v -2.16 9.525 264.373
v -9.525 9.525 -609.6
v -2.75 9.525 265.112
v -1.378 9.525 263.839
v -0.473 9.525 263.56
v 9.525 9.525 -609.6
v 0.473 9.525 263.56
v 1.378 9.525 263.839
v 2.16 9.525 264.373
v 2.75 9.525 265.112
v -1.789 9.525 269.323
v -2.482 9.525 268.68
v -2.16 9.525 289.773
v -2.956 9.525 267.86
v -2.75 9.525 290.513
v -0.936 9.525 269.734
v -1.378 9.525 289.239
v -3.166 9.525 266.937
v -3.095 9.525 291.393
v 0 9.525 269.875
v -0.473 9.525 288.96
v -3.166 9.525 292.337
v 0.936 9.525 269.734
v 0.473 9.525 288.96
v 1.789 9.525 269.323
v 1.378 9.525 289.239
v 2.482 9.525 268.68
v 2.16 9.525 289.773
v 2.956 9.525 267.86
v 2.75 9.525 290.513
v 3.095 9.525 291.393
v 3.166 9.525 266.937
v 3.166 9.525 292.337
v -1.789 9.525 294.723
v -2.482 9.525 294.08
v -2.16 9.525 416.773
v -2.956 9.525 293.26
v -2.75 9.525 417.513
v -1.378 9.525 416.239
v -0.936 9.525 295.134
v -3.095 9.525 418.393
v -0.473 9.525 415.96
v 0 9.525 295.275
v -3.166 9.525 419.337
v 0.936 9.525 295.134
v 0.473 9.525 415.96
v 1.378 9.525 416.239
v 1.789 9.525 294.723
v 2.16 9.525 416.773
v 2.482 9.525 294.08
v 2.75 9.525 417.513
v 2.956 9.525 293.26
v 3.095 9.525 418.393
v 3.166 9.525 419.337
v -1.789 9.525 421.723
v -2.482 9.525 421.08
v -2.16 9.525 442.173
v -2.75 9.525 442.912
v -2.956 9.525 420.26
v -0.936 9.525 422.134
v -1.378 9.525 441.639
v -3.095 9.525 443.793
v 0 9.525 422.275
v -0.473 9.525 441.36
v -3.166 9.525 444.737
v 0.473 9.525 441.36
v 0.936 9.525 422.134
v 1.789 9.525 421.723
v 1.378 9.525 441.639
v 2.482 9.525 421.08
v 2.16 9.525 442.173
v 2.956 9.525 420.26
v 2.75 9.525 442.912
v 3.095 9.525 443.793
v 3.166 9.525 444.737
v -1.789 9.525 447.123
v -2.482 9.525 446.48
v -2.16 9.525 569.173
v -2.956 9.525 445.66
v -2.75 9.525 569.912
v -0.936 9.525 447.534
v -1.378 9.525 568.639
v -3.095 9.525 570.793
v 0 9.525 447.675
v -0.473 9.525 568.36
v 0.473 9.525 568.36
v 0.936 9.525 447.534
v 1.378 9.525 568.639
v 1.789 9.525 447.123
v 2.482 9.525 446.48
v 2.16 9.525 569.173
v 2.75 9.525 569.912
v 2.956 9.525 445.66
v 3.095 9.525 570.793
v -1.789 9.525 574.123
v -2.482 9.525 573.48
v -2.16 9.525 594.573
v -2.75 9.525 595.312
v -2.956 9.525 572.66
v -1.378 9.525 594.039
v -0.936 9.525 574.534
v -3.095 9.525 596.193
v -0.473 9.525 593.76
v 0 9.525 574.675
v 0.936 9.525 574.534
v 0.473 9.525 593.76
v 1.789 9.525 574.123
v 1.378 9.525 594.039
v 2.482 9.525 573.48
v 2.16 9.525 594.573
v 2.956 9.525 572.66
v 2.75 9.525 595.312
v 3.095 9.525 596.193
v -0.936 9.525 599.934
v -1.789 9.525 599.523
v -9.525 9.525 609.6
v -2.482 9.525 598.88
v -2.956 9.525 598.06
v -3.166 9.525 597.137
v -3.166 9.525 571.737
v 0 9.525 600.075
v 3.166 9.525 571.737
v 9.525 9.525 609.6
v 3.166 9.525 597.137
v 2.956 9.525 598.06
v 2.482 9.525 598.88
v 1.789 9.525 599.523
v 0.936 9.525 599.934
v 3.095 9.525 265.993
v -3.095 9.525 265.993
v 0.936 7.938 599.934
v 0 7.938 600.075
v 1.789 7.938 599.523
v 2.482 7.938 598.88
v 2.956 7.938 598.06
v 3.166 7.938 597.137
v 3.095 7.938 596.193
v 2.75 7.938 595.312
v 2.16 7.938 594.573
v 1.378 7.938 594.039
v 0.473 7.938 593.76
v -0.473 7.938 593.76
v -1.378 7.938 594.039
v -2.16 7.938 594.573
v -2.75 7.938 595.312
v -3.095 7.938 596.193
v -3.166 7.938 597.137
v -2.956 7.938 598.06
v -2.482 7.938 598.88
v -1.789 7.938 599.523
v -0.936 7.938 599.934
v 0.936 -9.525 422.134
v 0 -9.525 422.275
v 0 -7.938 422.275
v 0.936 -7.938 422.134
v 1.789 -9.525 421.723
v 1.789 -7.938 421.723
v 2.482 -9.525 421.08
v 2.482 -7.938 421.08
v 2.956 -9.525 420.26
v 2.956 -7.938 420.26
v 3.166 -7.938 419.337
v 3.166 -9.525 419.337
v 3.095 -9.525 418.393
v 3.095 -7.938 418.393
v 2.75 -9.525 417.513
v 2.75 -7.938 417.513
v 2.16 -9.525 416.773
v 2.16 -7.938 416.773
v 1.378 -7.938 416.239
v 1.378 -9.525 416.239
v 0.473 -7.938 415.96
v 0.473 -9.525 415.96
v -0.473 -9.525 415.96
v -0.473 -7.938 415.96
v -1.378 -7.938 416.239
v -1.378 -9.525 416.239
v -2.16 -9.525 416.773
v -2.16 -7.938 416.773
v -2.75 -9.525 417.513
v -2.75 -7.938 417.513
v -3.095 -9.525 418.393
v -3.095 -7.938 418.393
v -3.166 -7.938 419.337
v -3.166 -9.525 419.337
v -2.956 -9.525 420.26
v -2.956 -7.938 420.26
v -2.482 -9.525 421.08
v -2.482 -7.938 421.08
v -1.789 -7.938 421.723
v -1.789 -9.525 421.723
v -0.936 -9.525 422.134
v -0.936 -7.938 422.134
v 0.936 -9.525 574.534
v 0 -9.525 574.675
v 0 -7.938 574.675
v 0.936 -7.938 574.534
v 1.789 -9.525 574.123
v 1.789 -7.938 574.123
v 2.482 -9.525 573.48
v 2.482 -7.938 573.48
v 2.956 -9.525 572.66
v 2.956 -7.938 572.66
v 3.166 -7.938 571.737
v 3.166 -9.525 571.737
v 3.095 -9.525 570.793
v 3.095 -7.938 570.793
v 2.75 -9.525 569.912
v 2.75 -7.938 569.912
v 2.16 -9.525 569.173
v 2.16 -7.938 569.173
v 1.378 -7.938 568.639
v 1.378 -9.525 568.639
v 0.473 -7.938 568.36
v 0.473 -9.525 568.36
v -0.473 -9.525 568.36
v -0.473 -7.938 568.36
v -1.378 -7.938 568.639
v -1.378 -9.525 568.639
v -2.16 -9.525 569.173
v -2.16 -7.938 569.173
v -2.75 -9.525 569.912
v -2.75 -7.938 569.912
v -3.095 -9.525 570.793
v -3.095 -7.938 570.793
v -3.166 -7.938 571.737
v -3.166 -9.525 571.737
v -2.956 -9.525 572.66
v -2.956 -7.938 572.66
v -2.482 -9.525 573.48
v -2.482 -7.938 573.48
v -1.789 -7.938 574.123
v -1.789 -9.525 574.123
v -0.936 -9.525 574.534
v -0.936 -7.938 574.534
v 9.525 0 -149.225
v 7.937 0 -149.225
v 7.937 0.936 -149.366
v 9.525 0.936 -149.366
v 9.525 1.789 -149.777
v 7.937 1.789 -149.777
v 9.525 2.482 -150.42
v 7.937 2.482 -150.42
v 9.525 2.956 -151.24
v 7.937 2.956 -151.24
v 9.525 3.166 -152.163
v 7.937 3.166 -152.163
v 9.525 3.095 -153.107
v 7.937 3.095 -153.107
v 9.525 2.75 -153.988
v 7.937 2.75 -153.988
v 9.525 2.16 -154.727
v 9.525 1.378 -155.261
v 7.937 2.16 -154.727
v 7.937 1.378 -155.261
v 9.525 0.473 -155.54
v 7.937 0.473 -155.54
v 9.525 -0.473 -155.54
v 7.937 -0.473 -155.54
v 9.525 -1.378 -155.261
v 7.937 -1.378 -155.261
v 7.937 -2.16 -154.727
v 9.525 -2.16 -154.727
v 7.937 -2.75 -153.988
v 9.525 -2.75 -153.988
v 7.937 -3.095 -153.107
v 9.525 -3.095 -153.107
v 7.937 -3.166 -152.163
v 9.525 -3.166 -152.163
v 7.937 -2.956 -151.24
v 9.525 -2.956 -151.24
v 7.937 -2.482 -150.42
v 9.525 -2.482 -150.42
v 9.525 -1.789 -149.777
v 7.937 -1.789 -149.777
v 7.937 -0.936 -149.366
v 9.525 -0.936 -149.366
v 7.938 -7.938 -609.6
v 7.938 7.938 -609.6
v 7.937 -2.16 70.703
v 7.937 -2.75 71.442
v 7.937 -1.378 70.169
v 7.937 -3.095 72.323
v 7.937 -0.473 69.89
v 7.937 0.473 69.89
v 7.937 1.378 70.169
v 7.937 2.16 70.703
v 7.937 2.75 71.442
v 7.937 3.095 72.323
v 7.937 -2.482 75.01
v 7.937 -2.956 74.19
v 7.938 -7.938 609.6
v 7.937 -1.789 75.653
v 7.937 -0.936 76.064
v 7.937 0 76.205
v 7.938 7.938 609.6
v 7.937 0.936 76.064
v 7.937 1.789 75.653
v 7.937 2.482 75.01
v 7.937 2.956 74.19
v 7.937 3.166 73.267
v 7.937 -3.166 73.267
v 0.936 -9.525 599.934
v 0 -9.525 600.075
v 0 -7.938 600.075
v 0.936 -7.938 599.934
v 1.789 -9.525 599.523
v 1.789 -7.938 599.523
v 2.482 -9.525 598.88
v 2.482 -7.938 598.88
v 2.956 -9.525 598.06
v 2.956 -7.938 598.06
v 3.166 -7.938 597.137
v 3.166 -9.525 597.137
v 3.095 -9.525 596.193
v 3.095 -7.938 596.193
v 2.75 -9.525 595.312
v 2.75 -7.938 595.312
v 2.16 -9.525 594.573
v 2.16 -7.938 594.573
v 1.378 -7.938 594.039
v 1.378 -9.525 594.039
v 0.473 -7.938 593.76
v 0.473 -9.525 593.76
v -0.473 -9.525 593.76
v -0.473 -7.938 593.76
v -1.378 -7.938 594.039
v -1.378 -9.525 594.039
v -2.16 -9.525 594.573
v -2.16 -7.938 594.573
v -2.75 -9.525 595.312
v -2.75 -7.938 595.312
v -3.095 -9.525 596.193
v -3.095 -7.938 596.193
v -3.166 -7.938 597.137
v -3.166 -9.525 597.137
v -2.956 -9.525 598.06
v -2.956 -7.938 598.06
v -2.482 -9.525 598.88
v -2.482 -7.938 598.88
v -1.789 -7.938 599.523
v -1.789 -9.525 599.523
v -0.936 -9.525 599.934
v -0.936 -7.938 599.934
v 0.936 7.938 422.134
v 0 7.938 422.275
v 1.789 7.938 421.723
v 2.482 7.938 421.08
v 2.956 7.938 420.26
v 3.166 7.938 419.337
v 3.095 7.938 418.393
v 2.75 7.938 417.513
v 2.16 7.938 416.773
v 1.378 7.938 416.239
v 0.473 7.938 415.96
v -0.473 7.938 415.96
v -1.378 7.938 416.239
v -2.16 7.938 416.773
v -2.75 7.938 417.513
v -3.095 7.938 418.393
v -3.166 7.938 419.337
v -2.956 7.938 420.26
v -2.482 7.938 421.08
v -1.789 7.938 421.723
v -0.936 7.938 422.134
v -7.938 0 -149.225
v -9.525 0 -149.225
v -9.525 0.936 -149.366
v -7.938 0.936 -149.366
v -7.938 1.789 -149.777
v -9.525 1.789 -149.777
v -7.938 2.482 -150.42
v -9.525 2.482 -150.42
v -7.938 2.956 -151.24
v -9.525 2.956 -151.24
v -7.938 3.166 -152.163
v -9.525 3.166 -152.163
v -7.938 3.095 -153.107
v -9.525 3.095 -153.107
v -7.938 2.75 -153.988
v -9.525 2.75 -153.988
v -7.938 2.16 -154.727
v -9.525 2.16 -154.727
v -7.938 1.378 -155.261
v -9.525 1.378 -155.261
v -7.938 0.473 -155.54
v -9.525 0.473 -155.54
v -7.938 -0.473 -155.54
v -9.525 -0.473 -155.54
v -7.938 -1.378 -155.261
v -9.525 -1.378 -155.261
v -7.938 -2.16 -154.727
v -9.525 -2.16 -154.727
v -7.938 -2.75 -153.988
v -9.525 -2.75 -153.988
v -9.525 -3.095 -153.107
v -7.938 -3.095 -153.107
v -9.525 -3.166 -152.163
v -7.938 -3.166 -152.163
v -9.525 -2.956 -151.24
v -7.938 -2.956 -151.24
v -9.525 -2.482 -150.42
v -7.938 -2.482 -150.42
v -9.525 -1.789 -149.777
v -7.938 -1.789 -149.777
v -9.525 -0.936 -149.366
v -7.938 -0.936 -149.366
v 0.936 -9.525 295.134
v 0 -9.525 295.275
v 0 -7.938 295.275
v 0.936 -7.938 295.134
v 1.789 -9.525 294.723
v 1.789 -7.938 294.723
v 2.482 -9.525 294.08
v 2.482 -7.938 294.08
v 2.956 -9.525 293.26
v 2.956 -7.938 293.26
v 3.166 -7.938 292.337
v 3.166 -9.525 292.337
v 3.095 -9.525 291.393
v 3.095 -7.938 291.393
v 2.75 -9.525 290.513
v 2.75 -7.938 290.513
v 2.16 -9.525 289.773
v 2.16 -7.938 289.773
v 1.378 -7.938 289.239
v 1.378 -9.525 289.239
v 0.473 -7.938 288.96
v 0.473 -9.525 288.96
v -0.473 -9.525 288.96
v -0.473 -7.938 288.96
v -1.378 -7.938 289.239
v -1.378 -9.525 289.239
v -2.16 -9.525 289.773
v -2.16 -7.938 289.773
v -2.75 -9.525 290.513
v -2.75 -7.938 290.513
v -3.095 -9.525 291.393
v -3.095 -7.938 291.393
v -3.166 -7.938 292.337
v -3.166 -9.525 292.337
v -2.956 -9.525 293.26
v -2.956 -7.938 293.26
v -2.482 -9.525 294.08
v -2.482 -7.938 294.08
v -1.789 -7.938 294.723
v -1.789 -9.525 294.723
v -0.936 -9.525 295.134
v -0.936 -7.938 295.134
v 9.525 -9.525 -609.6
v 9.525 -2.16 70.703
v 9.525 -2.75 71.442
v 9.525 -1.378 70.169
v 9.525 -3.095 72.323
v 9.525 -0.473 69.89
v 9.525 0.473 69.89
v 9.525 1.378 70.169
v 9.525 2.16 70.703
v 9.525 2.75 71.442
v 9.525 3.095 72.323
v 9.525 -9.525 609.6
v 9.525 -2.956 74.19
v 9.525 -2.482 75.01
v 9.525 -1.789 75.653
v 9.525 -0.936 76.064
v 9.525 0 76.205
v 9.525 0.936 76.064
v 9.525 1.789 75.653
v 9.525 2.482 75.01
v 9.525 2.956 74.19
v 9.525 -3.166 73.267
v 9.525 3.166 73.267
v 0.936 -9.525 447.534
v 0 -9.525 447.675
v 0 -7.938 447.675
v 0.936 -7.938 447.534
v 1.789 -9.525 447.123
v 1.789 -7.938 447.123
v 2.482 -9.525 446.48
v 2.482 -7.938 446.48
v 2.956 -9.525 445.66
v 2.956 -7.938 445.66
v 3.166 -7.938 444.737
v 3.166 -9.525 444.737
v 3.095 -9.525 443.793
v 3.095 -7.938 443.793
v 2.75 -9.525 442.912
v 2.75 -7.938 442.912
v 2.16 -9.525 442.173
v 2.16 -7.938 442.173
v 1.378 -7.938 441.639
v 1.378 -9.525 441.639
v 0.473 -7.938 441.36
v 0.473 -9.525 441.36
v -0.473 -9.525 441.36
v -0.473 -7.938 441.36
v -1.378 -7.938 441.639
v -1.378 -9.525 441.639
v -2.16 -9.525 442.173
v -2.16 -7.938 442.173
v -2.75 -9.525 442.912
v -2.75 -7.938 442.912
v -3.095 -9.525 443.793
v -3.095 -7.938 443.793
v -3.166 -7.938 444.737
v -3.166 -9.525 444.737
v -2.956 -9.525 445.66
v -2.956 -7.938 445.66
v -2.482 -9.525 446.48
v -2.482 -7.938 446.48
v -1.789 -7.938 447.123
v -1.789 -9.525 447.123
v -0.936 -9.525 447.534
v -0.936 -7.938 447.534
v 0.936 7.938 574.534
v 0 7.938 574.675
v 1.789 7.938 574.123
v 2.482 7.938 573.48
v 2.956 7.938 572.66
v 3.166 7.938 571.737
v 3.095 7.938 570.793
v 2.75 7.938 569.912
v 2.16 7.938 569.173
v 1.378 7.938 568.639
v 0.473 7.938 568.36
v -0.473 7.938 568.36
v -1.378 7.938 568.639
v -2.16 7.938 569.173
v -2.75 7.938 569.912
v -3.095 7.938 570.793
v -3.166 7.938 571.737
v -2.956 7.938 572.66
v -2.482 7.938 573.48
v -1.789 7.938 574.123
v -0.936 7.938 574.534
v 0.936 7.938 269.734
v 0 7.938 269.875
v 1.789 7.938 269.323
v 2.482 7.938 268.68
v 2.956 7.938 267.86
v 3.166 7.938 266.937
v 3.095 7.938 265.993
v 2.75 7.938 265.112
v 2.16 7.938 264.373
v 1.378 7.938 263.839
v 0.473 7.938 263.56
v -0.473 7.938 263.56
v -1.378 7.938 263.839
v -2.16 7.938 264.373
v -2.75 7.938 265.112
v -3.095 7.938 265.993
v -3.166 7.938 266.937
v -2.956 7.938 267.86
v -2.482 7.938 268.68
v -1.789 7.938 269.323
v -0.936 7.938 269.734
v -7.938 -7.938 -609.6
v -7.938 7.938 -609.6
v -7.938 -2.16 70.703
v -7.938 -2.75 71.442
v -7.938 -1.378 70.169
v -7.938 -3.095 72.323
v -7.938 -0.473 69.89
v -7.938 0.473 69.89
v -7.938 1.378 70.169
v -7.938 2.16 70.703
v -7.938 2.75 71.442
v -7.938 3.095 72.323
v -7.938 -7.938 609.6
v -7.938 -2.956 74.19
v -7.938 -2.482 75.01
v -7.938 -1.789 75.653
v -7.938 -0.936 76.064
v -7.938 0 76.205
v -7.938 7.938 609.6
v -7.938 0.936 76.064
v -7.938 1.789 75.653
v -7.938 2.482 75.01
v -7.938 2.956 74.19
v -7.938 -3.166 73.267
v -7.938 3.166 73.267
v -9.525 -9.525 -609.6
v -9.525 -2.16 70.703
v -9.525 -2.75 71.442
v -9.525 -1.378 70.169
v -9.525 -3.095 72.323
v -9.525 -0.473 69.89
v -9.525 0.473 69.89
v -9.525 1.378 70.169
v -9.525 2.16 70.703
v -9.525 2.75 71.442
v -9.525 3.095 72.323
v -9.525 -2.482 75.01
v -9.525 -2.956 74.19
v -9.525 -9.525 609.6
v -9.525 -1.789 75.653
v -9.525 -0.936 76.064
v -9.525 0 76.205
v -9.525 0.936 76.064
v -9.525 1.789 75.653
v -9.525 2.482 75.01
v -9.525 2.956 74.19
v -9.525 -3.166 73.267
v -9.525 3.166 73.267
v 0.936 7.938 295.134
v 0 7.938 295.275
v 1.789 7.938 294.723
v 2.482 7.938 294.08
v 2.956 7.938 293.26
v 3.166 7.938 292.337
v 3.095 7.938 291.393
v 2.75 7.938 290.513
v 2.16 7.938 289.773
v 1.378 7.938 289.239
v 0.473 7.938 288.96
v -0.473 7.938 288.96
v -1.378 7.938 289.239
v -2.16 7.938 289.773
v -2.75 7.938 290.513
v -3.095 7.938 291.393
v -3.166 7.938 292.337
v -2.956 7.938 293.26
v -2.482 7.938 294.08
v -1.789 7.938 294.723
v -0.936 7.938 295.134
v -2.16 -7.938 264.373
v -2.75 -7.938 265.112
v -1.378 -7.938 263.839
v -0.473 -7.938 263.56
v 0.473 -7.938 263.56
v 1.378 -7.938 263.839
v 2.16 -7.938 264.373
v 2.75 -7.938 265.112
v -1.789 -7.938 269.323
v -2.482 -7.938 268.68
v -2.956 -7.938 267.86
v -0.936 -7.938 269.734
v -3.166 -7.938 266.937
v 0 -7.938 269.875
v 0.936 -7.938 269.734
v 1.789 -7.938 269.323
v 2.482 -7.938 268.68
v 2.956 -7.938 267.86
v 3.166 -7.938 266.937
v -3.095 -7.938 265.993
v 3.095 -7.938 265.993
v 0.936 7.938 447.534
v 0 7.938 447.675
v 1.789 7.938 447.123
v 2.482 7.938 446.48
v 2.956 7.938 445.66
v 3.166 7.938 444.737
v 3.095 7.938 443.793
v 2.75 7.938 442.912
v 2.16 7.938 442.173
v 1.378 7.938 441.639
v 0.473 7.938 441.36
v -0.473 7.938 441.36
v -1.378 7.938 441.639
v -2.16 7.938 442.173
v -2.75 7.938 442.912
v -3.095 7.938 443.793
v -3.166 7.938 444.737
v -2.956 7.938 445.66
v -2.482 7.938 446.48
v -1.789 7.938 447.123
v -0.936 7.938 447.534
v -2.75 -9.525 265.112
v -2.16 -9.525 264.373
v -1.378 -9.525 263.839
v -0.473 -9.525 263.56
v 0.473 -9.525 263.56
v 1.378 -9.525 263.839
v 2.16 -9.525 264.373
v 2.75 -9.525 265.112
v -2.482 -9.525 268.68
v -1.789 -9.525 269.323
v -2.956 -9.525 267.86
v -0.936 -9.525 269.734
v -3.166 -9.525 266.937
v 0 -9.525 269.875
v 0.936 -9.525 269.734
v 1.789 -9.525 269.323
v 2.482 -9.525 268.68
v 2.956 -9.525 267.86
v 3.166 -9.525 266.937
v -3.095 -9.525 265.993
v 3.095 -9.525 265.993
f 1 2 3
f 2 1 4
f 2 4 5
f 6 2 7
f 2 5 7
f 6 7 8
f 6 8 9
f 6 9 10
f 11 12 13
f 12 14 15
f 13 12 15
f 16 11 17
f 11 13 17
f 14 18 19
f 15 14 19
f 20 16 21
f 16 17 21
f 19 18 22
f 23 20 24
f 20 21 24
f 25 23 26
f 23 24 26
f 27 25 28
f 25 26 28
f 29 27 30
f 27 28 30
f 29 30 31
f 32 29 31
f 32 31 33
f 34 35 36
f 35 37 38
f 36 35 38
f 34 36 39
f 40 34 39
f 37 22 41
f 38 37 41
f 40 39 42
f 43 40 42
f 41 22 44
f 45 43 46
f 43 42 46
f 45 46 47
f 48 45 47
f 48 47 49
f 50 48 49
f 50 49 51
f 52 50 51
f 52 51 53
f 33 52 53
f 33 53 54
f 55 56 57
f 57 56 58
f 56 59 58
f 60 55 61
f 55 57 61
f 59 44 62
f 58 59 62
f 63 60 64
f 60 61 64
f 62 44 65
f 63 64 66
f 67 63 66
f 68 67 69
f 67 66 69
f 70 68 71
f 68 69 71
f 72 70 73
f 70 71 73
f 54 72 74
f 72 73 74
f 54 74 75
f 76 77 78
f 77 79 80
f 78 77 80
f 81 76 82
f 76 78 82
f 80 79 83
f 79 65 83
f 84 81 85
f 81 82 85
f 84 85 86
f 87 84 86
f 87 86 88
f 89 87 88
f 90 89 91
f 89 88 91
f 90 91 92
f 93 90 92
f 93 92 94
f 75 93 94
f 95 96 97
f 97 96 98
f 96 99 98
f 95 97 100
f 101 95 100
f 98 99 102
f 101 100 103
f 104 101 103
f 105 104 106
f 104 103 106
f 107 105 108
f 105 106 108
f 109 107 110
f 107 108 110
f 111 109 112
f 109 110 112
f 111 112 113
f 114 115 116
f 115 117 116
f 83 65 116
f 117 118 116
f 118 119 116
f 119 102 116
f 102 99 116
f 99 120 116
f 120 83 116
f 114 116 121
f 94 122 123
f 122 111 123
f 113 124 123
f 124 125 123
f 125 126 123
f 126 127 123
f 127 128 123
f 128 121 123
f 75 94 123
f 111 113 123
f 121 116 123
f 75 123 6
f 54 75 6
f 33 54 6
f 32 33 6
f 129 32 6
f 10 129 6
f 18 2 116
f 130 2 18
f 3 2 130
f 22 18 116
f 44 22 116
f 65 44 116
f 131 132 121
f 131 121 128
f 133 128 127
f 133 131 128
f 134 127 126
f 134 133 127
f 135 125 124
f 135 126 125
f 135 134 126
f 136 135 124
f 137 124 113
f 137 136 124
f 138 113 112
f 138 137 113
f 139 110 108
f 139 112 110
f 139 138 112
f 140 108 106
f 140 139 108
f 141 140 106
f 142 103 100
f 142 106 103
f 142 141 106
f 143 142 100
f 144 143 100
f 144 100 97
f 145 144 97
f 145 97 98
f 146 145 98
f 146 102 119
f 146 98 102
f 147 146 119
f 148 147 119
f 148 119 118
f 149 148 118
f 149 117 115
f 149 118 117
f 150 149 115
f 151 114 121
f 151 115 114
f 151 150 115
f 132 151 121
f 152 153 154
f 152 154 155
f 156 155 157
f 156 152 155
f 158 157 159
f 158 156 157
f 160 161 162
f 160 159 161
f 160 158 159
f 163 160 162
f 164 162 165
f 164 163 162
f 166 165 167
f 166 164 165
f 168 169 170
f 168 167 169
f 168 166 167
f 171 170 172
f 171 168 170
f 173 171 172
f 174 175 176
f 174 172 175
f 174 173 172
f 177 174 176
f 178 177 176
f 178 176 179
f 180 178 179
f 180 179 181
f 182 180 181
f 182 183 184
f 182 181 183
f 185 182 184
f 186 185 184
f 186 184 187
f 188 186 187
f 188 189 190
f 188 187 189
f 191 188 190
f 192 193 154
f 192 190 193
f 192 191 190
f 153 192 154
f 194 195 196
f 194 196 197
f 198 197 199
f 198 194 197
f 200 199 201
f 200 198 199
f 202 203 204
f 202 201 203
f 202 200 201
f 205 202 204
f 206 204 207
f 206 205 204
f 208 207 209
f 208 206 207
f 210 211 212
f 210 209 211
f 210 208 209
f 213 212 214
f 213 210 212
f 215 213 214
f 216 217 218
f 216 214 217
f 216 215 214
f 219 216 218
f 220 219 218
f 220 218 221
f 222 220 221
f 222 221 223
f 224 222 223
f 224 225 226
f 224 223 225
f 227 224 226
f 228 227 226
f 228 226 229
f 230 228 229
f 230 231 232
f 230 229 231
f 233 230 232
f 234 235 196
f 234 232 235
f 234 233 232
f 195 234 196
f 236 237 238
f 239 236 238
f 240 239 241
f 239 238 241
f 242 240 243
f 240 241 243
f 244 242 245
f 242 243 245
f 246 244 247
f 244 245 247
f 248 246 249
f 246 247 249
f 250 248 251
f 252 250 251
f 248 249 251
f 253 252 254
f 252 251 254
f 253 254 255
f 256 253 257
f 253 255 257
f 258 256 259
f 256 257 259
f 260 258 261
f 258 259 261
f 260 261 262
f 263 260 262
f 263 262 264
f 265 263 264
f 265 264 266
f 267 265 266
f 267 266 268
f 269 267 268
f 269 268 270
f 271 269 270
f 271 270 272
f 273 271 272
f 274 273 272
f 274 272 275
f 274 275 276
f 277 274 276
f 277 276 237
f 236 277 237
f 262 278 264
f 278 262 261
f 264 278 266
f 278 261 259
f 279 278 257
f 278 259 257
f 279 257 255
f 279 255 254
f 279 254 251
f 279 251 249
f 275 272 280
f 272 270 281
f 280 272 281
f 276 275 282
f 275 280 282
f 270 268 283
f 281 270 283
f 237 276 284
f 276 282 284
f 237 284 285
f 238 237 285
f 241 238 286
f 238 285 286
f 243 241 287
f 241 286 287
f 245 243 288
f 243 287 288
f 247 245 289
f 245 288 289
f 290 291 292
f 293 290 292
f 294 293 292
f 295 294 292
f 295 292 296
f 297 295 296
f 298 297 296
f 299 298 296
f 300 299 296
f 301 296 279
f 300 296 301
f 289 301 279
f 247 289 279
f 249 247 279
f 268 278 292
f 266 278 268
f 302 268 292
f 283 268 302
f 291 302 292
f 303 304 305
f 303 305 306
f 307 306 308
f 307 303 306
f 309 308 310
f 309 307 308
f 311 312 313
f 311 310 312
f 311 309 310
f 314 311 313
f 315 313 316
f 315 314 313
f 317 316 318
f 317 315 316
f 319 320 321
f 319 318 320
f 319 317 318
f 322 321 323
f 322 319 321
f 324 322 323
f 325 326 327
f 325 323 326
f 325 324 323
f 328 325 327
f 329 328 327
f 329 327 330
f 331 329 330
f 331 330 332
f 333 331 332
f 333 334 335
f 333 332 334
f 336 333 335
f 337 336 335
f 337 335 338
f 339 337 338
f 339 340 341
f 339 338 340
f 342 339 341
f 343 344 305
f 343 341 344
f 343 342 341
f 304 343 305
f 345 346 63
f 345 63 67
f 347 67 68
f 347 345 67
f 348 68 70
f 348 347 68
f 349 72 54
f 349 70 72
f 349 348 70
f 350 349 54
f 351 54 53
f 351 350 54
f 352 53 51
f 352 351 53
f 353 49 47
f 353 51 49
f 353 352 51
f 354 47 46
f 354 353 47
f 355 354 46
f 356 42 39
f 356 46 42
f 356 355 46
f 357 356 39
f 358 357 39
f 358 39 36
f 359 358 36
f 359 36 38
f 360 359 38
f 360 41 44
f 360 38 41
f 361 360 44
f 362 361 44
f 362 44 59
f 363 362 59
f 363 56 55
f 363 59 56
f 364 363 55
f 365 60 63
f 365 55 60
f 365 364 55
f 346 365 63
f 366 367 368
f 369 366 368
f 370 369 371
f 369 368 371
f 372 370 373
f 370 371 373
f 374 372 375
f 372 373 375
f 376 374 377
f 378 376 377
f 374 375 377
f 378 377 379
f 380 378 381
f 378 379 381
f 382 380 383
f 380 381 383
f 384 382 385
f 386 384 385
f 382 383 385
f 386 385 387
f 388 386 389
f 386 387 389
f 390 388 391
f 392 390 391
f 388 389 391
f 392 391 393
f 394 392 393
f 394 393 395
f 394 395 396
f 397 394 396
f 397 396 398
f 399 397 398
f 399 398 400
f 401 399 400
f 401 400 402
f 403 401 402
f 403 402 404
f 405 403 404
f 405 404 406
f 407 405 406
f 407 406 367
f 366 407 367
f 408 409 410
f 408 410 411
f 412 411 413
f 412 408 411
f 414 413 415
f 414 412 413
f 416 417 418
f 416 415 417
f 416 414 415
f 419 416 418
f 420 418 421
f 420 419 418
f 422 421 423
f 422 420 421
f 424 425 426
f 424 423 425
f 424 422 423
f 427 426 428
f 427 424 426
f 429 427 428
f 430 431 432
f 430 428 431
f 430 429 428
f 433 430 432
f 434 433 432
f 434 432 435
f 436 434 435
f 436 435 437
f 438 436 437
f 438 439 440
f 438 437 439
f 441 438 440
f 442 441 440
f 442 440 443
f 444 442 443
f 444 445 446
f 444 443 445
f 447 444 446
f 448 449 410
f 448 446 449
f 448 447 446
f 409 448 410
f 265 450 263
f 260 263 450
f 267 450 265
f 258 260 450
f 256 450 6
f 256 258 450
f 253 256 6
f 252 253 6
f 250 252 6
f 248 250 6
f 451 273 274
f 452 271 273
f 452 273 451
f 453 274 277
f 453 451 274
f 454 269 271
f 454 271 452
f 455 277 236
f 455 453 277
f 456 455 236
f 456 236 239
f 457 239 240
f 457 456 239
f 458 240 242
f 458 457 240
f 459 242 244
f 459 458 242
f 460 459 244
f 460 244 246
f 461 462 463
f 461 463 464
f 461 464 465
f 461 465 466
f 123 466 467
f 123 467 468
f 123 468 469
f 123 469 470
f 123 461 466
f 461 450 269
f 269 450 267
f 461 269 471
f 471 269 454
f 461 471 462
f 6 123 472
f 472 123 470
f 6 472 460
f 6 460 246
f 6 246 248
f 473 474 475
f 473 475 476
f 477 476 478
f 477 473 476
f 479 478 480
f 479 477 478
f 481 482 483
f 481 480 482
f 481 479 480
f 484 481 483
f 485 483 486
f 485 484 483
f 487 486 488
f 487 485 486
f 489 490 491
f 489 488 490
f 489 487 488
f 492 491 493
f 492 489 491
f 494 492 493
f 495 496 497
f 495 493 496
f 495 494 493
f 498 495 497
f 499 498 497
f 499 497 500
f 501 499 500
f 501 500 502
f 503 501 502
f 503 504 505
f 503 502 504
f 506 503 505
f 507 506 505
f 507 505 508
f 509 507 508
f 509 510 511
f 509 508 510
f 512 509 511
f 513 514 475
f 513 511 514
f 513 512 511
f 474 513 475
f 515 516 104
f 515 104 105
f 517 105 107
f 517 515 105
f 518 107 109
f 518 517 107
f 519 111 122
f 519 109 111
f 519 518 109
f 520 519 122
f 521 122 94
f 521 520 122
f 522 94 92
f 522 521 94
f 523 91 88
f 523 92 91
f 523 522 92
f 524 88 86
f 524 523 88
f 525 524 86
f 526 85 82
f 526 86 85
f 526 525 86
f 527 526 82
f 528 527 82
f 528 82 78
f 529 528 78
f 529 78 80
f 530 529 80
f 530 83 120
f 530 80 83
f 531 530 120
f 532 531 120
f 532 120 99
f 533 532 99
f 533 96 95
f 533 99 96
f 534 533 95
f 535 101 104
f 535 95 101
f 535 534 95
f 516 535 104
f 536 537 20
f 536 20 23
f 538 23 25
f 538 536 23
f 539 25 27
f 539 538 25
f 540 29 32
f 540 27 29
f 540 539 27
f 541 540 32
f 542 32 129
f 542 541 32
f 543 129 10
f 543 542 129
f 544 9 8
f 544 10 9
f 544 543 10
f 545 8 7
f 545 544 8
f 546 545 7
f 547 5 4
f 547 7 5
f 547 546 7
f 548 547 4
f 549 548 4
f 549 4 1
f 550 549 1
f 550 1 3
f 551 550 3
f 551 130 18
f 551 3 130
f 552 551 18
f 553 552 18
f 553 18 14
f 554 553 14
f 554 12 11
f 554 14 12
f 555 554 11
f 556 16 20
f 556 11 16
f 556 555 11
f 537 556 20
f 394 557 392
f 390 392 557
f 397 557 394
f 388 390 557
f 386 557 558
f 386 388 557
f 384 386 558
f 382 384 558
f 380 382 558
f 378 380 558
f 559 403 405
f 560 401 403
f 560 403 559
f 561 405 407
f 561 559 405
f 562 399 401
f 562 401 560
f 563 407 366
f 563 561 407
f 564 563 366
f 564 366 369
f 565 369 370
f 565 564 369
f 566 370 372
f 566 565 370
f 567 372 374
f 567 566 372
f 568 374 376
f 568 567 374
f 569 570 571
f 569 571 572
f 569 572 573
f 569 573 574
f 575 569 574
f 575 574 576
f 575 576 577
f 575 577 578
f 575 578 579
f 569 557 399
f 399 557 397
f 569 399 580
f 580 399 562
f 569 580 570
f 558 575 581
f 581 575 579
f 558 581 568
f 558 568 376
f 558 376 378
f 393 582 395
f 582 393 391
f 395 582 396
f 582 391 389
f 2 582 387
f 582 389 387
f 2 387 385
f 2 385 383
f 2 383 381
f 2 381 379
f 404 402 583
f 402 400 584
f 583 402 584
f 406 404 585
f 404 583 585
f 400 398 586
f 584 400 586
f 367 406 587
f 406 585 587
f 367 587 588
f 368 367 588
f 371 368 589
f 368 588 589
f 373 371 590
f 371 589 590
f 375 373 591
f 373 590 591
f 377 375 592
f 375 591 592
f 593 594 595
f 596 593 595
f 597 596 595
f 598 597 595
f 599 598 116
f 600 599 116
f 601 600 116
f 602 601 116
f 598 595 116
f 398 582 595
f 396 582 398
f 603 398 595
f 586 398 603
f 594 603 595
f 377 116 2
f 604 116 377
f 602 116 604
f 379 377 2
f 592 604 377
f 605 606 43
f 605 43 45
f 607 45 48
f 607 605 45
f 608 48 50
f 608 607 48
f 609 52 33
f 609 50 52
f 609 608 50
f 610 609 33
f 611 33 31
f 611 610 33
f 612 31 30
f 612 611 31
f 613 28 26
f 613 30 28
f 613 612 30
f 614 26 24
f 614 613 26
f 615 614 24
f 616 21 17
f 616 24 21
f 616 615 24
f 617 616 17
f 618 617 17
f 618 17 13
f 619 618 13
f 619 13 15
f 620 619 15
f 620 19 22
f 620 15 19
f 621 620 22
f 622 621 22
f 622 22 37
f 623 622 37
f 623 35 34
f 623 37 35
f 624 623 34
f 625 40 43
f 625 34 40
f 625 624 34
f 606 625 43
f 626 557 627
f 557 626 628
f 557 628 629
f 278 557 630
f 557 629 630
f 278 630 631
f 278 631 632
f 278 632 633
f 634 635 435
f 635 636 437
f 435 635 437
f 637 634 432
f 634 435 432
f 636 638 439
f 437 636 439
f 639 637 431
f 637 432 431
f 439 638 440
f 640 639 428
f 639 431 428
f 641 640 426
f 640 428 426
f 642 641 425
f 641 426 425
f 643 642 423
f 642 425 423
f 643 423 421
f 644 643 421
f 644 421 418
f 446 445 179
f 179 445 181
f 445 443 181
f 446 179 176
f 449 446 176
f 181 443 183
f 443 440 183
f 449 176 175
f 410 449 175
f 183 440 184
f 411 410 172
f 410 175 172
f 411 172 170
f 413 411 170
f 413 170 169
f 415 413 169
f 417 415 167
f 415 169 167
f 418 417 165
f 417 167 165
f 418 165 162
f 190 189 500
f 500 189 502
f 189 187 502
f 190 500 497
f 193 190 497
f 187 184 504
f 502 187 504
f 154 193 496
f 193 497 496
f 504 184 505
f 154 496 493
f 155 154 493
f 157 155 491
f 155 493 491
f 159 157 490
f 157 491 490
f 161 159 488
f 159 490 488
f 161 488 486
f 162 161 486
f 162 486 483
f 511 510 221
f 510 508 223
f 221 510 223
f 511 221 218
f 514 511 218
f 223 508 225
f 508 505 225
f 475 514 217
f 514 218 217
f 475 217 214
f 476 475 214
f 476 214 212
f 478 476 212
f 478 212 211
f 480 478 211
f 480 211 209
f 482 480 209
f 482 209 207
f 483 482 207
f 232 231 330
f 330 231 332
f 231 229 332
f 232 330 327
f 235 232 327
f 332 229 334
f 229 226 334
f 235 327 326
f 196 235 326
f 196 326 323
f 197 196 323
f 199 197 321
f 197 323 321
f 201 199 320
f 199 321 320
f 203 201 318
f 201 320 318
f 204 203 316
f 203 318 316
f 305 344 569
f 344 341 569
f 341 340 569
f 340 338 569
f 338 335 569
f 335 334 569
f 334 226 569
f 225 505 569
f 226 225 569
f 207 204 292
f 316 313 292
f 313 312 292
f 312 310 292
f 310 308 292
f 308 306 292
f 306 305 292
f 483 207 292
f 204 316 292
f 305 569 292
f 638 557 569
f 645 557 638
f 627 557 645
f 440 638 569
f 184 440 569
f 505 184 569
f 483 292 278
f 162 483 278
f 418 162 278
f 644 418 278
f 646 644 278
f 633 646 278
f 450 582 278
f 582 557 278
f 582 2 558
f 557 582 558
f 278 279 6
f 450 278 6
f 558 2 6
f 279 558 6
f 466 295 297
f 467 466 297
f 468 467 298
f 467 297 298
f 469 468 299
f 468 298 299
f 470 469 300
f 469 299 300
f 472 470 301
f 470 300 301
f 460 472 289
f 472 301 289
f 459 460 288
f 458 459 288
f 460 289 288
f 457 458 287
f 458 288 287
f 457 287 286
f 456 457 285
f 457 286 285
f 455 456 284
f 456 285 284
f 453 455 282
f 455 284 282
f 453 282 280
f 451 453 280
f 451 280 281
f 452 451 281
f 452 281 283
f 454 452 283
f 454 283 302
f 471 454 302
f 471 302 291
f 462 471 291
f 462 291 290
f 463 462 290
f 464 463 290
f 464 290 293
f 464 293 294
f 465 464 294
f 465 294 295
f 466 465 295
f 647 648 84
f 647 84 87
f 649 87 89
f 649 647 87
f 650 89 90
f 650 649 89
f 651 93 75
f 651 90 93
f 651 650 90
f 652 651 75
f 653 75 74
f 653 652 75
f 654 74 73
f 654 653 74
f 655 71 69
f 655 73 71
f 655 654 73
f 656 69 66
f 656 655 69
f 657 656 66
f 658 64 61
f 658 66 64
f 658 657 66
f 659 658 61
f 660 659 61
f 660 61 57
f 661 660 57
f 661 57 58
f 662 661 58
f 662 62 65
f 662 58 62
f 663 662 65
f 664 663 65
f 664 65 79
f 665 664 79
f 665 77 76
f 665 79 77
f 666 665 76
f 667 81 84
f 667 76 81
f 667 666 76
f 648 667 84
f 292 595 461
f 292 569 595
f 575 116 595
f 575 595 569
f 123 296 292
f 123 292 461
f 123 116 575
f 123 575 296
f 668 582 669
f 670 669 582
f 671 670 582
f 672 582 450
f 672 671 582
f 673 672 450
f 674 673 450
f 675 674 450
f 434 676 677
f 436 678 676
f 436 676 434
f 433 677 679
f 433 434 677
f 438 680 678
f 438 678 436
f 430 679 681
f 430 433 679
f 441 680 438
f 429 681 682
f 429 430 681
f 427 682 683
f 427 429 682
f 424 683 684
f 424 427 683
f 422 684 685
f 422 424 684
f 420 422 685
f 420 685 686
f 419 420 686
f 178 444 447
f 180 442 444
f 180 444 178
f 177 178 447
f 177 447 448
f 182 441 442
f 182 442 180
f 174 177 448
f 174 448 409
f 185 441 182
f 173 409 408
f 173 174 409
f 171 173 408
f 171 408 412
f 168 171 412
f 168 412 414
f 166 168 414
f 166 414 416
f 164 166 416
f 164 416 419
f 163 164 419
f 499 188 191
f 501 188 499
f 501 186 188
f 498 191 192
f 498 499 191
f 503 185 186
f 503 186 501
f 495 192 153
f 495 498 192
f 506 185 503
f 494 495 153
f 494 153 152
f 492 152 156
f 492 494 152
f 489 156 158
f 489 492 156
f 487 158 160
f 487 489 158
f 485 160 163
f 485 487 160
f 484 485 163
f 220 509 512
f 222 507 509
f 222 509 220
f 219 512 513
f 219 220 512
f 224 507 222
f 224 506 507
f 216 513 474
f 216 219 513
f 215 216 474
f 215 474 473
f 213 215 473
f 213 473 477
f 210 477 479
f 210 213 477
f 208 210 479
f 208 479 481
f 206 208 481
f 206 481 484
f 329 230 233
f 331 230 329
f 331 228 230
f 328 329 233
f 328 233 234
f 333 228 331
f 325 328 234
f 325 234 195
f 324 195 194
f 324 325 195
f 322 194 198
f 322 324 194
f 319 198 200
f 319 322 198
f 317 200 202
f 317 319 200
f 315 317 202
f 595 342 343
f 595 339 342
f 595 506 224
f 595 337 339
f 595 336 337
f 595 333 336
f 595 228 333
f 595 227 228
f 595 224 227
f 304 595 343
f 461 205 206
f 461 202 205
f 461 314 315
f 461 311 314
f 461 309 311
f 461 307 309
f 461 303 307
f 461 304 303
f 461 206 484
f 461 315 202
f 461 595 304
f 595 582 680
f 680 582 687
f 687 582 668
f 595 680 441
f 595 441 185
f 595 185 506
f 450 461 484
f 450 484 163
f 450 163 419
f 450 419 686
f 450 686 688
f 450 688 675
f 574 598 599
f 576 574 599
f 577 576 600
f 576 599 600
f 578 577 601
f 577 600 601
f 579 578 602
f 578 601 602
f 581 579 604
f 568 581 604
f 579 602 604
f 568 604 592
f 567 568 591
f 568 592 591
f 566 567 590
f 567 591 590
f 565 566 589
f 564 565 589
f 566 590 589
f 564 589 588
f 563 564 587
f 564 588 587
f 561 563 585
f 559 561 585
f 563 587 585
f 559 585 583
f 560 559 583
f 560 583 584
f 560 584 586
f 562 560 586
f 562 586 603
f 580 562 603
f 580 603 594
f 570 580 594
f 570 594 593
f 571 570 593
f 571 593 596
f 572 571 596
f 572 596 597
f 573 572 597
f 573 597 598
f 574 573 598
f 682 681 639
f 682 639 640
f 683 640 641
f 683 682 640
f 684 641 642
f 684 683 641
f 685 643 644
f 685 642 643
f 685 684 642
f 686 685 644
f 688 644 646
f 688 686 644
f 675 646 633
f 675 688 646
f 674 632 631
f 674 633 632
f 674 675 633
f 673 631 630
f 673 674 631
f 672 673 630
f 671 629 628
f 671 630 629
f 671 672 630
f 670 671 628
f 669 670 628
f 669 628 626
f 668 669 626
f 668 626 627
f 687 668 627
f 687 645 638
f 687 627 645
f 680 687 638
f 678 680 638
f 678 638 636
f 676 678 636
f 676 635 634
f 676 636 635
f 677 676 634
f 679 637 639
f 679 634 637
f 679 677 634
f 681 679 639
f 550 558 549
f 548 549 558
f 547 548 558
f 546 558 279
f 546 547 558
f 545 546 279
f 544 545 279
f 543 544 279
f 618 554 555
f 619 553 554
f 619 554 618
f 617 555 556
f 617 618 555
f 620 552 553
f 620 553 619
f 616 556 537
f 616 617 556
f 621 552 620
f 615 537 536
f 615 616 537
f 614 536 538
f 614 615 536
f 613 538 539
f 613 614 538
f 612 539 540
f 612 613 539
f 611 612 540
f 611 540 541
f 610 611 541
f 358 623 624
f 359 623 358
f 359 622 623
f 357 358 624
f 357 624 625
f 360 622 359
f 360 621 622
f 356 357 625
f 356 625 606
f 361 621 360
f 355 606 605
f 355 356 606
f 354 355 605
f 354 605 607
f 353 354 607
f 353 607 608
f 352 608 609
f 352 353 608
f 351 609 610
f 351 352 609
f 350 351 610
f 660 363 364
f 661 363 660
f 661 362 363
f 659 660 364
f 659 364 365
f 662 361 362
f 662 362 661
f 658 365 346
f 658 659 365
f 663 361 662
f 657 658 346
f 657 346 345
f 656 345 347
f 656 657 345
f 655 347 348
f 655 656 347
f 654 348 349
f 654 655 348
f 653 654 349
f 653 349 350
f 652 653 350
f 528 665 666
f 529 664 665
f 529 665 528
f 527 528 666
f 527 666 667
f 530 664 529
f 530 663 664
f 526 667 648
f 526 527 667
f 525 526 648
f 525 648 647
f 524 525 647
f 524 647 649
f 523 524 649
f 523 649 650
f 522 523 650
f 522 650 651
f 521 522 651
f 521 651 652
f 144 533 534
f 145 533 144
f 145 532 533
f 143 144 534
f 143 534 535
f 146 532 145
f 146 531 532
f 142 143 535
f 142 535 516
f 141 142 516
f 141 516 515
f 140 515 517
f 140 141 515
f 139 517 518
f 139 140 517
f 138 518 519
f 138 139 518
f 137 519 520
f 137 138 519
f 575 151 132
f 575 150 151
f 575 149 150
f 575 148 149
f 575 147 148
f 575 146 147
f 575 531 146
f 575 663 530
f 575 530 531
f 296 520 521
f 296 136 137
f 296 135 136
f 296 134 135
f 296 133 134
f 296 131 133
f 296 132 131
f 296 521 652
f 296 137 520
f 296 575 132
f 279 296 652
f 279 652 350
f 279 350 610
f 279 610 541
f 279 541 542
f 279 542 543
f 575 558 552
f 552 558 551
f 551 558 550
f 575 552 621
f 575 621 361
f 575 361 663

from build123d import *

# Parameters (mm, degrees)
SKETCH1_W               = 19.05
SKETCH1_H               = 19.05
SKETCH1_W_2             = 15.875
SKETCH1_H_2             = 15.875
BOSS_EXTRUDE1_DEPTH     = 609.6
CUT_EXTRUDE1_DEPTH      = 610.748809962
CUT_EXTRUDE1_DEPTH_BACK = 610.748809962
SKETCH2_R               = 3.175
SKETCH3_R               = 3.175
CUT_EXTRUDE2_DEPTH      = 610.971956835


with BuildPart() as part:
    # Sketch1 → Boss-Extrude1 (new, symmetric)
    with BuildSketch(Plane.XY):
        Rectangle(SKETCH1_W, SKETCH1_H)
        Rectangle(SKETCH1_W_2, SKETCH1_H_2, mode=Mode.SUBTRACT)
    extrude(amount=BOSS_EXTRUDE1_DEPTH, both=True)

    # Sketch2 → Cut-Extrude1 (cut, two sides: drawn at the far end of the back side and taken through both)
    with BuildSketch(Plane(origin=(0, 0, 0), x_dir=(1, 0, 0), z_dir=(0, 1, 0)).offset(-CUT_EXTRUDE1_DEPTH_BACK)):
        with Locations(Location((0, -596.9, 0), (0, 0, 270))):
            Circle(SKETCH2_R)
        with Locations(Location((0, -571.5, 0), (0, 0, 270))):
            Circle(SKETCH2_R)
        with Locations(Location((0, -444.5, 0), (0, 0, 270))):
            Circle(SKETCH2_R)
        with Locations(Location((0, -419.1, 0), (0, 0, 270))):
            Circle(SKETCH2_R)
        with Locations(Location((0, -292.1, 0), (0, 0, 270))):
            Circle(SKETCH2_R)
        with Locations(Location((0, -266.7, 0), (0, 0, 270))):
            Circle(SKETCH2_R)
    extrude(amount=CUT_EXTRUDE1_DEPTH + CUT_EXTRUDE1_DEPTH_BACK, mode=Mode.SUBTRACT)

    # Sketch3 → Cut-Extrude2 (cut, through all)
    with BuildSketch(Plane.ZY.offset(9.525)):
        with Locations((-152.4, 0)):
            Circle(SKETCH3_R)
        with Locations((73.03, 0)):
            Circle(SKETCH3_R)
    extrude(amount=-CUT_EXTRUDE2_DEPTH, mode=Mode.SUBTRACT)


solid = part.part
